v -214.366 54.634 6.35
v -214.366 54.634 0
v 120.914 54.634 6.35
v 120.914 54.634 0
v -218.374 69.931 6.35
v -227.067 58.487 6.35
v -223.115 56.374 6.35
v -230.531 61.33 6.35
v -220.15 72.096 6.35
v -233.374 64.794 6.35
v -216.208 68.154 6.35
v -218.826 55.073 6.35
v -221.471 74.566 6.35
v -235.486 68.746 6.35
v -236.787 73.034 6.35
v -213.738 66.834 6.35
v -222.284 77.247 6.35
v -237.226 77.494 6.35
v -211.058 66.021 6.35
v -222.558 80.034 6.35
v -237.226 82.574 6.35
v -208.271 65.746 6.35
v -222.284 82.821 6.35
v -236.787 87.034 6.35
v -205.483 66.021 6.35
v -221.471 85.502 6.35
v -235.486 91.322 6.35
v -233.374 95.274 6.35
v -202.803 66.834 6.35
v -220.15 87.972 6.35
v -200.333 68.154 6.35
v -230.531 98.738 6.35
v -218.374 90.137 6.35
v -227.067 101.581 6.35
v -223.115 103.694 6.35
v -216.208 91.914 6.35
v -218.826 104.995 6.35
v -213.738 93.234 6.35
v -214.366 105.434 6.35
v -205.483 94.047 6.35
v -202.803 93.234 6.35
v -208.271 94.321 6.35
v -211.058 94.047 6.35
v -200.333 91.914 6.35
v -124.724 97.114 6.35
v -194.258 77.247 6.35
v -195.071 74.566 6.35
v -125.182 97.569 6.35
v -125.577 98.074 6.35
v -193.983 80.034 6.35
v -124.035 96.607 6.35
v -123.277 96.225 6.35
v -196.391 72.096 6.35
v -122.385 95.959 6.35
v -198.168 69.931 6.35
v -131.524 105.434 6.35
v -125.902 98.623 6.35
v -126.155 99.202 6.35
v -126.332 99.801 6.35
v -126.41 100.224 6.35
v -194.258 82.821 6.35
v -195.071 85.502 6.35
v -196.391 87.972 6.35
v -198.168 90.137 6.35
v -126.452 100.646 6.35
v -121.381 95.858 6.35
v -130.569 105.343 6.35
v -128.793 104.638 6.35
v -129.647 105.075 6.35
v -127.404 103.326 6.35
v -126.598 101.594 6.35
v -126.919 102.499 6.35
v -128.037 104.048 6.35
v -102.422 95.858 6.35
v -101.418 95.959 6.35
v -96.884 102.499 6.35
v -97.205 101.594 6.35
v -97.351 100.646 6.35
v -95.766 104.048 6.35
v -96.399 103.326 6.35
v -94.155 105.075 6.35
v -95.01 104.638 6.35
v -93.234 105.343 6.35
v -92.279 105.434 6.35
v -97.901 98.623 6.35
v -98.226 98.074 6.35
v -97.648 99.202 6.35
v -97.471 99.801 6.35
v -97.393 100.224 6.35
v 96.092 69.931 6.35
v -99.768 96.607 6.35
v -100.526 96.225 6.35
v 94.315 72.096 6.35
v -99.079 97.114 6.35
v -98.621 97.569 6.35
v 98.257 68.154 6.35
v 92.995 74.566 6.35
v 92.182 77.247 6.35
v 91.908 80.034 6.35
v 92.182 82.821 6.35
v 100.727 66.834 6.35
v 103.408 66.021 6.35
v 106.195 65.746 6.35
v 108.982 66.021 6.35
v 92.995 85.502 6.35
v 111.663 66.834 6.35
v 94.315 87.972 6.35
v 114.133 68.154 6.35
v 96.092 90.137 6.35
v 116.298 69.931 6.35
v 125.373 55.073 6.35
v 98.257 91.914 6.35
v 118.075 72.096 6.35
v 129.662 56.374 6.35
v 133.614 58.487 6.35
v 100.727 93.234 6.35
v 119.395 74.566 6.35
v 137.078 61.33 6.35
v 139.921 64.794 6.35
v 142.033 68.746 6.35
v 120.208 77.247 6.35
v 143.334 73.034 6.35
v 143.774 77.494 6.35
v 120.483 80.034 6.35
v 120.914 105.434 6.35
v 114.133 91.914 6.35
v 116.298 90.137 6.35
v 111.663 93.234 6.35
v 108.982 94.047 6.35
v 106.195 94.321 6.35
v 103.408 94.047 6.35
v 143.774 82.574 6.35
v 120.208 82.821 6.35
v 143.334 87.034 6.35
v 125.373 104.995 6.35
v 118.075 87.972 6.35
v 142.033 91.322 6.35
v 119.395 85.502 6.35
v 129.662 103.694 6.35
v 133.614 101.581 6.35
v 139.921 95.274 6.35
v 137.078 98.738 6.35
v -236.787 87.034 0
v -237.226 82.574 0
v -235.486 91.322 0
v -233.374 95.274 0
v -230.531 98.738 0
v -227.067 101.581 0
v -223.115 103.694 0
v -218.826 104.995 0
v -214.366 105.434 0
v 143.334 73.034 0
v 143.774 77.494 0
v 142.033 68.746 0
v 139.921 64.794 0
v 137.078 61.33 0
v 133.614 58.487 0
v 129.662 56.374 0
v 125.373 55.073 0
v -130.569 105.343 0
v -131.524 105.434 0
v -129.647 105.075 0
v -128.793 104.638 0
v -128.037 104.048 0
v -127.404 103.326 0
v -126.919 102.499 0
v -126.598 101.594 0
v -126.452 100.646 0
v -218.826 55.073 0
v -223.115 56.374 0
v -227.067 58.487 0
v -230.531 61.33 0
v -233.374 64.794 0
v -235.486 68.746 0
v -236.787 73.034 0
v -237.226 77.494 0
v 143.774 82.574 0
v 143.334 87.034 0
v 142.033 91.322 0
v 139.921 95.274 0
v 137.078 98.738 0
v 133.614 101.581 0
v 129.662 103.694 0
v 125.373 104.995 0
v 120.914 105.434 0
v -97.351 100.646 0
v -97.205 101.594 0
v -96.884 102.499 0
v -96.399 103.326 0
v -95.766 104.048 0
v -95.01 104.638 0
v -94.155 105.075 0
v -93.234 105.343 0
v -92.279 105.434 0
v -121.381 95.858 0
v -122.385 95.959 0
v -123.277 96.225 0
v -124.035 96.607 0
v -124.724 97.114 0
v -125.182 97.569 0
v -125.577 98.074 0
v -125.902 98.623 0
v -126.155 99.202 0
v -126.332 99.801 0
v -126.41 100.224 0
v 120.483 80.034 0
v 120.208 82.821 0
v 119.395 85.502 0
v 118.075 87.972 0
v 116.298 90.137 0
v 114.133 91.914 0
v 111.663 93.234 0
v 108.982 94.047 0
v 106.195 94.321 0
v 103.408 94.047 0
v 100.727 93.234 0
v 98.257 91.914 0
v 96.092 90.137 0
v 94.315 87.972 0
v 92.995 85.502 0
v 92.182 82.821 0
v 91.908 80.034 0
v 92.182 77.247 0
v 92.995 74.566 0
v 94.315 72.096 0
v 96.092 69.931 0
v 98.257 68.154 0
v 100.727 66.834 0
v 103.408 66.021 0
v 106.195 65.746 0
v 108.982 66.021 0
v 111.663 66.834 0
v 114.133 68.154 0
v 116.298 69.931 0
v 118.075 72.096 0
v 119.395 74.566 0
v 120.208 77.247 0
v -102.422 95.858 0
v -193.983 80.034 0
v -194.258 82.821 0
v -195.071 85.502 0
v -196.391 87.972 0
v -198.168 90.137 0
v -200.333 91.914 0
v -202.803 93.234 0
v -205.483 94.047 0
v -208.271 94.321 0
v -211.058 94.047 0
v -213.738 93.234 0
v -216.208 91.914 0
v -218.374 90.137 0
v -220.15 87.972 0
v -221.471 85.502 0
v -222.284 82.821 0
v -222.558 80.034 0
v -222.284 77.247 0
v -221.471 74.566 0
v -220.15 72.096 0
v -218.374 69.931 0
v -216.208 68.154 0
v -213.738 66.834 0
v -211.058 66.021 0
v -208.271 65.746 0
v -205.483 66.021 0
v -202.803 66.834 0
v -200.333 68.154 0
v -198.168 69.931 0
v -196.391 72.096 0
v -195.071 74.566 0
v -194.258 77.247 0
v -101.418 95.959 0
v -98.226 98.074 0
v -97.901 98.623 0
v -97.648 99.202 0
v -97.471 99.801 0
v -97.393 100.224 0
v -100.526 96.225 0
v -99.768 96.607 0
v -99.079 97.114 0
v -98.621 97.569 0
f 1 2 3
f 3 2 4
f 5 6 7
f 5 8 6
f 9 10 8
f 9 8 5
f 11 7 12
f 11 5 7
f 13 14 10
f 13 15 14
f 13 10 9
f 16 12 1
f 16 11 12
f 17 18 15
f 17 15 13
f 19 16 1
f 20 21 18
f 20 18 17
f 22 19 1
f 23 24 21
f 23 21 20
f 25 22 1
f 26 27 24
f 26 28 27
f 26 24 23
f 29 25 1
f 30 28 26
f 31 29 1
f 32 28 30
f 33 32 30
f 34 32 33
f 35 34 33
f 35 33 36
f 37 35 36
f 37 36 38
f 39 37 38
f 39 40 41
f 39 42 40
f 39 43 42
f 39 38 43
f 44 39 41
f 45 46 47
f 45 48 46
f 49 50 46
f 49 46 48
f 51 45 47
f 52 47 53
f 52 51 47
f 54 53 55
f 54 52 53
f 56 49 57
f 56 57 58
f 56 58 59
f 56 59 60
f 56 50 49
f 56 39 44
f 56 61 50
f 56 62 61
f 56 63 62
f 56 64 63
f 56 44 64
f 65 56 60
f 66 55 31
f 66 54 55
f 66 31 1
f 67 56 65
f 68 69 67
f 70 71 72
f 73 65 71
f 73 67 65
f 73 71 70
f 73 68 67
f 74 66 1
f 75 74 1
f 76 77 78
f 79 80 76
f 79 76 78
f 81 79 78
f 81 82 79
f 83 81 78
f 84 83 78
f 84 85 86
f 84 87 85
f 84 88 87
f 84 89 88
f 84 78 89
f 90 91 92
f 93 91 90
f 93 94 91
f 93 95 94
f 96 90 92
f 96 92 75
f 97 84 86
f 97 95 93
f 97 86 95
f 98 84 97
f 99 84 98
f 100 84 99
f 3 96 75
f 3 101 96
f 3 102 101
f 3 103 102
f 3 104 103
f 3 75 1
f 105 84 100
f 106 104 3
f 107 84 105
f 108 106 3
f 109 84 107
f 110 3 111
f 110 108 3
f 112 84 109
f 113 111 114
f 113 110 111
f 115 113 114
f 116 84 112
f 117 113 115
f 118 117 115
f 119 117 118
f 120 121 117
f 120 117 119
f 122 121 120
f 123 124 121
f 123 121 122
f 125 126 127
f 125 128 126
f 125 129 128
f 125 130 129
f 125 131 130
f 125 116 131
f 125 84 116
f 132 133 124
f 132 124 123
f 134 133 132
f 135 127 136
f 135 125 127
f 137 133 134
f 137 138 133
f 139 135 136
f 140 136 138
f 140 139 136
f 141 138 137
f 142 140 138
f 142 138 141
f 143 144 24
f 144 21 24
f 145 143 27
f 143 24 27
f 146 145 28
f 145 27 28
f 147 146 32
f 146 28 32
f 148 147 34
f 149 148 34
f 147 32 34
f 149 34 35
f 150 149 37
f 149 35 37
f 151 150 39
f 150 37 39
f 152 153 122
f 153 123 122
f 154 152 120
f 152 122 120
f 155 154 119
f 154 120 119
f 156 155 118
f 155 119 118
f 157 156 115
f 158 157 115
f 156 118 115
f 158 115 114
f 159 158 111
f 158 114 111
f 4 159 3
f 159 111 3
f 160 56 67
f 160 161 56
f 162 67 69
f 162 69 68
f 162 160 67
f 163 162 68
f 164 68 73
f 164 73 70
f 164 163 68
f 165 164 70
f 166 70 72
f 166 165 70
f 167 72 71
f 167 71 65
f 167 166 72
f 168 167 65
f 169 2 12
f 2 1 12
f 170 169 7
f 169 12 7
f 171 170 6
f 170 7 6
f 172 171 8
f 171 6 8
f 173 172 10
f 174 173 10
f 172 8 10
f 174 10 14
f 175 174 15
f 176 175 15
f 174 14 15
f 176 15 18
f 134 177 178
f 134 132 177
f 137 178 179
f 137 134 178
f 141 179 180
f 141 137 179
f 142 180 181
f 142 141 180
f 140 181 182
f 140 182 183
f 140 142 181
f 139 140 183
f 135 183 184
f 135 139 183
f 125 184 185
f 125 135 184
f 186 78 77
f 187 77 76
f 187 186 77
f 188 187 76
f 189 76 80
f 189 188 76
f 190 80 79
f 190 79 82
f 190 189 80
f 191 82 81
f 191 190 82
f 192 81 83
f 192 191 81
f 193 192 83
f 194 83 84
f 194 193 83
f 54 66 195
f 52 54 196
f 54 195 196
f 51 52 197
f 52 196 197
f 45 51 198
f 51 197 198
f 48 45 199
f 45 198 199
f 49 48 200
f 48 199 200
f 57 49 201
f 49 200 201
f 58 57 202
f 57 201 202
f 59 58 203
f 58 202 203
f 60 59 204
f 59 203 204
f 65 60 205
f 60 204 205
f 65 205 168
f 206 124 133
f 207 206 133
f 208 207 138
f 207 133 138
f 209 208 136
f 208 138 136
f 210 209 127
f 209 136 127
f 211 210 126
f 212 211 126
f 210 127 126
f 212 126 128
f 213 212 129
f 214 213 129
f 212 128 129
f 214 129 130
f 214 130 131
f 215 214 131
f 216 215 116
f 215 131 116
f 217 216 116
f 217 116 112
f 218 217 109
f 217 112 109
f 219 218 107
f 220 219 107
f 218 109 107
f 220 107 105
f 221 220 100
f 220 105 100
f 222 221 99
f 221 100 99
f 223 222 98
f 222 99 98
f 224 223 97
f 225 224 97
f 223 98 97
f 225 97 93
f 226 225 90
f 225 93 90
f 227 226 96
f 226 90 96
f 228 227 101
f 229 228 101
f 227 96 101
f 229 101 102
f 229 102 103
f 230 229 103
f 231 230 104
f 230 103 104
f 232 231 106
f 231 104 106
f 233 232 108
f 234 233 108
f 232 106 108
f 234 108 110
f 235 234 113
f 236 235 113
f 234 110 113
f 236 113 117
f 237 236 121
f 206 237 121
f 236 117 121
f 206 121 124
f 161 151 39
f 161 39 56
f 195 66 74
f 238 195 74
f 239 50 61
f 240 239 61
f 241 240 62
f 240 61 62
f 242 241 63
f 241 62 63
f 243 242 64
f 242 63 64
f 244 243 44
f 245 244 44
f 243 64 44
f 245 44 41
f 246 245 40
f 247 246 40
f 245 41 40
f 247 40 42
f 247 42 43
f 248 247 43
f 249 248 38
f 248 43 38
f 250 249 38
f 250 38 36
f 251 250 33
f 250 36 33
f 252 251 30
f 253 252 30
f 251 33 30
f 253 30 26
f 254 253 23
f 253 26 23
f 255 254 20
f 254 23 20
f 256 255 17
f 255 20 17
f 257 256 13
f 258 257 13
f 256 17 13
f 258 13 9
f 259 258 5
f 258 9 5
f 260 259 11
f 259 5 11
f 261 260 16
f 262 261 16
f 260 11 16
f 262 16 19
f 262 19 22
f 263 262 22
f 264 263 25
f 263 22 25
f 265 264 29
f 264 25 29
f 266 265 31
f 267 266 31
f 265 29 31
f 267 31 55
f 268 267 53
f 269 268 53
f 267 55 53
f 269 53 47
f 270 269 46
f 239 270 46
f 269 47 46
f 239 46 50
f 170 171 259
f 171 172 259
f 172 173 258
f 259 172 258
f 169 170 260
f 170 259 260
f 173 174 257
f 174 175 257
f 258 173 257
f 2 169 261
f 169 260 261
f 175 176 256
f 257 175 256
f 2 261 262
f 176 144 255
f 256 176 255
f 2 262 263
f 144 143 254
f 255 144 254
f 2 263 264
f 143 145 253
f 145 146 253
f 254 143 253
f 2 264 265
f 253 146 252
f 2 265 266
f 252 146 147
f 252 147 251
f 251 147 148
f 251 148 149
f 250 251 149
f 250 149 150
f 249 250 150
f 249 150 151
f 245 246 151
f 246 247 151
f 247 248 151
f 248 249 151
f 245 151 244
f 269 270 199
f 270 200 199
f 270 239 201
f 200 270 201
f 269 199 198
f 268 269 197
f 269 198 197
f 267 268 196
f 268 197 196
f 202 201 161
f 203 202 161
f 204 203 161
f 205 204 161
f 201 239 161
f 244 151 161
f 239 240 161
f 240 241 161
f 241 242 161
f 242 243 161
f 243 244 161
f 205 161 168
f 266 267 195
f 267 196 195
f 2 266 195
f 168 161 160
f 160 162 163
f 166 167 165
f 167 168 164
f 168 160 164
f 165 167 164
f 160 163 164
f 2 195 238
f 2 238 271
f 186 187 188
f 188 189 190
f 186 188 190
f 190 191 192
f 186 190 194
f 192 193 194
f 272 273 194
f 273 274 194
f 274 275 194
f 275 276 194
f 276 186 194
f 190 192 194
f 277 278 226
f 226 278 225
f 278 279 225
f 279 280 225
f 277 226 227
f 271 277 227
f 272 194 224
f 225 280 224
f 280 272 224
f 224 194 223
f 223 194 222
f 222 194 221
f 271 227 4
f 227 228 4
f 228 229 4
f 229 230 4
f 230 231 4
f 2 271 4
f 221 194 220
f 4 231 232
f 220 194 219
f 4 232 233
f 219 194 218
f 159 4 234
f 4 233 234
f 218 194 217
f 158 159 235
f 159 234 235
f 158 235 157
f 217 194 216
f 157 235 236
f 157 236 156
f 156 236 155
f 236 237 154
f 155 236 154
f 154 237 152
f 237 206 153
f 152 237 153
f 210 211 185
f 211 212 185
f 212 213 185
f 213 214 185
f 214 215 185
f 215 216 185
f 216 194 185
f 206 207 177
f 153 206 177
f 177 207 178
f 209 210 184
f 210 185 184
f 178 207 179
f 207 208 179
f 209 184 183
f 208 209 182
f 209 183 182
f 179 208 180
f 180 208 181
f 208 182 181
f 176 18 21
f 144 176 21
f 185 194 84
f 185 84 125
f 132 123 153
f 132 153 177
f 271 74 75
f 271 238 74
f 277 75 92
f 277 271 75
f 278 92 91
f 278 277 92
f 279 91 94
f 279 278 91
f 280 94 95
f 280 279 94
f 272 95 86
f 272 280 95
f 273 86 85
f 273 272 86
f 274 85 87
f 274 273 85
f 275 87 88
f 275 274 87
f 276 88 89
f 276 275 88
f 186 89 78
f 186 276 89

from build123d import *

# Parameters (mm, degrees)
SKETCH2_W           = 381
SKETCH2_H           = 50.8
BOSS_EXTRUDE1_DEPTH = 6.35
SKETCH3_R           = 14.2875
SKETCH3_W           = 29.084677523
SKETCH3_H           = 9.575779023
CUT_EXTRUDE1_DEPTH  = 6.35
FILLET4_R           = 22.86
FILLET5_R           = 22.86
FILLET6_R           = 22.86
FILLET7_R           = 22.86
FILLET12_R          = 5.08
FILLET13_R          = 5.08
FILLET14_R          = 5.08
FILLET15_R          = 5.08


with BuildPart() as part:
    # Sketch2 → Boss-Extrude1 (new body)
    with BuildSketch(Plane.XY):
        with Locations((-46.726415094, 80.033962264)):
            Rectangle(SKETCH2_W, SKETCH2_H)
    extrude(amount=BOSS_EXTRUDE1_DEPTH)

    # Sketch3 → Cut-Extrude1 (cut)
    with BuildSketch(Plane.XY.offset(6.35)):
        with Locations((-208.27071376, 80.033962264)):
            Circle(SKETCH3_R)
        with Locations((106.195061698, 80.033962264)):
            Circle(SKETCH3_R)
        with Locations((-111.901475121, 100.646072753)):
            Rectangle(SKETCH3_W, SKETCH3_H)
    extrude(amount=-CUT_EXTRUDE1_DEPTH, mode=Mode.SUBTRACT)

    # Fillet4
    fillet4_edges = [part.edges().sort_by_distance(p)[0] for p in [
        (143.773584906, 105.433962264, 3.175),
    ]]
    fillet(fillet4_edges, radius=FILLET4_R)

    # Fillet5
    fillet5_edges = [part.edges().sort_by_distance(p)[0] for p in [
        (143.773584906, 54.633962264, 3.175),
    ]]
    fillet(fillet5_edges, radius=FILLET5_R)

    # Fillet6
    fillet6_edges = [part.edges().sort_by_distance(p)[0] for p in [
        (-237.226415094, 54.633962264, 3.175),
    ]]
    fillet(fillet6_edges, radius=FILLET6_R)

    # Fillet7
    fillet7_edges = [part.edges().sort_by_distance(p)[0] for p in [
        (-237.226415094, 105.433962264, 3.175),
    ]]
    fillet(fillet7_edges, radius=FILLET7_R)

    # Fillet12
    fillet12_edges = [part.edges().sort_by_distance(p)[0] for p in [
        (-126.443813883, 105.433962264, 3.175),
    ]]
    fillet(fillet12_edges, radius=FILLET12_R)

    # Fillet13
    fillet13_edges = [part.edges().sort_by_distance(p)[0] for p in [
        (-97.35913636, 105.433962264, 3.175),
    ]]
    fillet(fillet13_edges, radius=FILLET13_R)

    # Fillet14
    fillet14_edges = [part.edges().sort_by_distance(p)[0] for p in [
        (-126.443813883, 95.858183241, 3.175),
    ]]
    fillet(fillet14_edges, radius=FILLET14_R)

    # Fillet15
    fillet15_edges = [part.edges().sort_by_distance(p)[0] for p in [
        (-97.35913636, 95.858183241, 3.175),
    ]]
    fillet(fillet15_edges, radius=FILLET15_R)


solid = part.part
